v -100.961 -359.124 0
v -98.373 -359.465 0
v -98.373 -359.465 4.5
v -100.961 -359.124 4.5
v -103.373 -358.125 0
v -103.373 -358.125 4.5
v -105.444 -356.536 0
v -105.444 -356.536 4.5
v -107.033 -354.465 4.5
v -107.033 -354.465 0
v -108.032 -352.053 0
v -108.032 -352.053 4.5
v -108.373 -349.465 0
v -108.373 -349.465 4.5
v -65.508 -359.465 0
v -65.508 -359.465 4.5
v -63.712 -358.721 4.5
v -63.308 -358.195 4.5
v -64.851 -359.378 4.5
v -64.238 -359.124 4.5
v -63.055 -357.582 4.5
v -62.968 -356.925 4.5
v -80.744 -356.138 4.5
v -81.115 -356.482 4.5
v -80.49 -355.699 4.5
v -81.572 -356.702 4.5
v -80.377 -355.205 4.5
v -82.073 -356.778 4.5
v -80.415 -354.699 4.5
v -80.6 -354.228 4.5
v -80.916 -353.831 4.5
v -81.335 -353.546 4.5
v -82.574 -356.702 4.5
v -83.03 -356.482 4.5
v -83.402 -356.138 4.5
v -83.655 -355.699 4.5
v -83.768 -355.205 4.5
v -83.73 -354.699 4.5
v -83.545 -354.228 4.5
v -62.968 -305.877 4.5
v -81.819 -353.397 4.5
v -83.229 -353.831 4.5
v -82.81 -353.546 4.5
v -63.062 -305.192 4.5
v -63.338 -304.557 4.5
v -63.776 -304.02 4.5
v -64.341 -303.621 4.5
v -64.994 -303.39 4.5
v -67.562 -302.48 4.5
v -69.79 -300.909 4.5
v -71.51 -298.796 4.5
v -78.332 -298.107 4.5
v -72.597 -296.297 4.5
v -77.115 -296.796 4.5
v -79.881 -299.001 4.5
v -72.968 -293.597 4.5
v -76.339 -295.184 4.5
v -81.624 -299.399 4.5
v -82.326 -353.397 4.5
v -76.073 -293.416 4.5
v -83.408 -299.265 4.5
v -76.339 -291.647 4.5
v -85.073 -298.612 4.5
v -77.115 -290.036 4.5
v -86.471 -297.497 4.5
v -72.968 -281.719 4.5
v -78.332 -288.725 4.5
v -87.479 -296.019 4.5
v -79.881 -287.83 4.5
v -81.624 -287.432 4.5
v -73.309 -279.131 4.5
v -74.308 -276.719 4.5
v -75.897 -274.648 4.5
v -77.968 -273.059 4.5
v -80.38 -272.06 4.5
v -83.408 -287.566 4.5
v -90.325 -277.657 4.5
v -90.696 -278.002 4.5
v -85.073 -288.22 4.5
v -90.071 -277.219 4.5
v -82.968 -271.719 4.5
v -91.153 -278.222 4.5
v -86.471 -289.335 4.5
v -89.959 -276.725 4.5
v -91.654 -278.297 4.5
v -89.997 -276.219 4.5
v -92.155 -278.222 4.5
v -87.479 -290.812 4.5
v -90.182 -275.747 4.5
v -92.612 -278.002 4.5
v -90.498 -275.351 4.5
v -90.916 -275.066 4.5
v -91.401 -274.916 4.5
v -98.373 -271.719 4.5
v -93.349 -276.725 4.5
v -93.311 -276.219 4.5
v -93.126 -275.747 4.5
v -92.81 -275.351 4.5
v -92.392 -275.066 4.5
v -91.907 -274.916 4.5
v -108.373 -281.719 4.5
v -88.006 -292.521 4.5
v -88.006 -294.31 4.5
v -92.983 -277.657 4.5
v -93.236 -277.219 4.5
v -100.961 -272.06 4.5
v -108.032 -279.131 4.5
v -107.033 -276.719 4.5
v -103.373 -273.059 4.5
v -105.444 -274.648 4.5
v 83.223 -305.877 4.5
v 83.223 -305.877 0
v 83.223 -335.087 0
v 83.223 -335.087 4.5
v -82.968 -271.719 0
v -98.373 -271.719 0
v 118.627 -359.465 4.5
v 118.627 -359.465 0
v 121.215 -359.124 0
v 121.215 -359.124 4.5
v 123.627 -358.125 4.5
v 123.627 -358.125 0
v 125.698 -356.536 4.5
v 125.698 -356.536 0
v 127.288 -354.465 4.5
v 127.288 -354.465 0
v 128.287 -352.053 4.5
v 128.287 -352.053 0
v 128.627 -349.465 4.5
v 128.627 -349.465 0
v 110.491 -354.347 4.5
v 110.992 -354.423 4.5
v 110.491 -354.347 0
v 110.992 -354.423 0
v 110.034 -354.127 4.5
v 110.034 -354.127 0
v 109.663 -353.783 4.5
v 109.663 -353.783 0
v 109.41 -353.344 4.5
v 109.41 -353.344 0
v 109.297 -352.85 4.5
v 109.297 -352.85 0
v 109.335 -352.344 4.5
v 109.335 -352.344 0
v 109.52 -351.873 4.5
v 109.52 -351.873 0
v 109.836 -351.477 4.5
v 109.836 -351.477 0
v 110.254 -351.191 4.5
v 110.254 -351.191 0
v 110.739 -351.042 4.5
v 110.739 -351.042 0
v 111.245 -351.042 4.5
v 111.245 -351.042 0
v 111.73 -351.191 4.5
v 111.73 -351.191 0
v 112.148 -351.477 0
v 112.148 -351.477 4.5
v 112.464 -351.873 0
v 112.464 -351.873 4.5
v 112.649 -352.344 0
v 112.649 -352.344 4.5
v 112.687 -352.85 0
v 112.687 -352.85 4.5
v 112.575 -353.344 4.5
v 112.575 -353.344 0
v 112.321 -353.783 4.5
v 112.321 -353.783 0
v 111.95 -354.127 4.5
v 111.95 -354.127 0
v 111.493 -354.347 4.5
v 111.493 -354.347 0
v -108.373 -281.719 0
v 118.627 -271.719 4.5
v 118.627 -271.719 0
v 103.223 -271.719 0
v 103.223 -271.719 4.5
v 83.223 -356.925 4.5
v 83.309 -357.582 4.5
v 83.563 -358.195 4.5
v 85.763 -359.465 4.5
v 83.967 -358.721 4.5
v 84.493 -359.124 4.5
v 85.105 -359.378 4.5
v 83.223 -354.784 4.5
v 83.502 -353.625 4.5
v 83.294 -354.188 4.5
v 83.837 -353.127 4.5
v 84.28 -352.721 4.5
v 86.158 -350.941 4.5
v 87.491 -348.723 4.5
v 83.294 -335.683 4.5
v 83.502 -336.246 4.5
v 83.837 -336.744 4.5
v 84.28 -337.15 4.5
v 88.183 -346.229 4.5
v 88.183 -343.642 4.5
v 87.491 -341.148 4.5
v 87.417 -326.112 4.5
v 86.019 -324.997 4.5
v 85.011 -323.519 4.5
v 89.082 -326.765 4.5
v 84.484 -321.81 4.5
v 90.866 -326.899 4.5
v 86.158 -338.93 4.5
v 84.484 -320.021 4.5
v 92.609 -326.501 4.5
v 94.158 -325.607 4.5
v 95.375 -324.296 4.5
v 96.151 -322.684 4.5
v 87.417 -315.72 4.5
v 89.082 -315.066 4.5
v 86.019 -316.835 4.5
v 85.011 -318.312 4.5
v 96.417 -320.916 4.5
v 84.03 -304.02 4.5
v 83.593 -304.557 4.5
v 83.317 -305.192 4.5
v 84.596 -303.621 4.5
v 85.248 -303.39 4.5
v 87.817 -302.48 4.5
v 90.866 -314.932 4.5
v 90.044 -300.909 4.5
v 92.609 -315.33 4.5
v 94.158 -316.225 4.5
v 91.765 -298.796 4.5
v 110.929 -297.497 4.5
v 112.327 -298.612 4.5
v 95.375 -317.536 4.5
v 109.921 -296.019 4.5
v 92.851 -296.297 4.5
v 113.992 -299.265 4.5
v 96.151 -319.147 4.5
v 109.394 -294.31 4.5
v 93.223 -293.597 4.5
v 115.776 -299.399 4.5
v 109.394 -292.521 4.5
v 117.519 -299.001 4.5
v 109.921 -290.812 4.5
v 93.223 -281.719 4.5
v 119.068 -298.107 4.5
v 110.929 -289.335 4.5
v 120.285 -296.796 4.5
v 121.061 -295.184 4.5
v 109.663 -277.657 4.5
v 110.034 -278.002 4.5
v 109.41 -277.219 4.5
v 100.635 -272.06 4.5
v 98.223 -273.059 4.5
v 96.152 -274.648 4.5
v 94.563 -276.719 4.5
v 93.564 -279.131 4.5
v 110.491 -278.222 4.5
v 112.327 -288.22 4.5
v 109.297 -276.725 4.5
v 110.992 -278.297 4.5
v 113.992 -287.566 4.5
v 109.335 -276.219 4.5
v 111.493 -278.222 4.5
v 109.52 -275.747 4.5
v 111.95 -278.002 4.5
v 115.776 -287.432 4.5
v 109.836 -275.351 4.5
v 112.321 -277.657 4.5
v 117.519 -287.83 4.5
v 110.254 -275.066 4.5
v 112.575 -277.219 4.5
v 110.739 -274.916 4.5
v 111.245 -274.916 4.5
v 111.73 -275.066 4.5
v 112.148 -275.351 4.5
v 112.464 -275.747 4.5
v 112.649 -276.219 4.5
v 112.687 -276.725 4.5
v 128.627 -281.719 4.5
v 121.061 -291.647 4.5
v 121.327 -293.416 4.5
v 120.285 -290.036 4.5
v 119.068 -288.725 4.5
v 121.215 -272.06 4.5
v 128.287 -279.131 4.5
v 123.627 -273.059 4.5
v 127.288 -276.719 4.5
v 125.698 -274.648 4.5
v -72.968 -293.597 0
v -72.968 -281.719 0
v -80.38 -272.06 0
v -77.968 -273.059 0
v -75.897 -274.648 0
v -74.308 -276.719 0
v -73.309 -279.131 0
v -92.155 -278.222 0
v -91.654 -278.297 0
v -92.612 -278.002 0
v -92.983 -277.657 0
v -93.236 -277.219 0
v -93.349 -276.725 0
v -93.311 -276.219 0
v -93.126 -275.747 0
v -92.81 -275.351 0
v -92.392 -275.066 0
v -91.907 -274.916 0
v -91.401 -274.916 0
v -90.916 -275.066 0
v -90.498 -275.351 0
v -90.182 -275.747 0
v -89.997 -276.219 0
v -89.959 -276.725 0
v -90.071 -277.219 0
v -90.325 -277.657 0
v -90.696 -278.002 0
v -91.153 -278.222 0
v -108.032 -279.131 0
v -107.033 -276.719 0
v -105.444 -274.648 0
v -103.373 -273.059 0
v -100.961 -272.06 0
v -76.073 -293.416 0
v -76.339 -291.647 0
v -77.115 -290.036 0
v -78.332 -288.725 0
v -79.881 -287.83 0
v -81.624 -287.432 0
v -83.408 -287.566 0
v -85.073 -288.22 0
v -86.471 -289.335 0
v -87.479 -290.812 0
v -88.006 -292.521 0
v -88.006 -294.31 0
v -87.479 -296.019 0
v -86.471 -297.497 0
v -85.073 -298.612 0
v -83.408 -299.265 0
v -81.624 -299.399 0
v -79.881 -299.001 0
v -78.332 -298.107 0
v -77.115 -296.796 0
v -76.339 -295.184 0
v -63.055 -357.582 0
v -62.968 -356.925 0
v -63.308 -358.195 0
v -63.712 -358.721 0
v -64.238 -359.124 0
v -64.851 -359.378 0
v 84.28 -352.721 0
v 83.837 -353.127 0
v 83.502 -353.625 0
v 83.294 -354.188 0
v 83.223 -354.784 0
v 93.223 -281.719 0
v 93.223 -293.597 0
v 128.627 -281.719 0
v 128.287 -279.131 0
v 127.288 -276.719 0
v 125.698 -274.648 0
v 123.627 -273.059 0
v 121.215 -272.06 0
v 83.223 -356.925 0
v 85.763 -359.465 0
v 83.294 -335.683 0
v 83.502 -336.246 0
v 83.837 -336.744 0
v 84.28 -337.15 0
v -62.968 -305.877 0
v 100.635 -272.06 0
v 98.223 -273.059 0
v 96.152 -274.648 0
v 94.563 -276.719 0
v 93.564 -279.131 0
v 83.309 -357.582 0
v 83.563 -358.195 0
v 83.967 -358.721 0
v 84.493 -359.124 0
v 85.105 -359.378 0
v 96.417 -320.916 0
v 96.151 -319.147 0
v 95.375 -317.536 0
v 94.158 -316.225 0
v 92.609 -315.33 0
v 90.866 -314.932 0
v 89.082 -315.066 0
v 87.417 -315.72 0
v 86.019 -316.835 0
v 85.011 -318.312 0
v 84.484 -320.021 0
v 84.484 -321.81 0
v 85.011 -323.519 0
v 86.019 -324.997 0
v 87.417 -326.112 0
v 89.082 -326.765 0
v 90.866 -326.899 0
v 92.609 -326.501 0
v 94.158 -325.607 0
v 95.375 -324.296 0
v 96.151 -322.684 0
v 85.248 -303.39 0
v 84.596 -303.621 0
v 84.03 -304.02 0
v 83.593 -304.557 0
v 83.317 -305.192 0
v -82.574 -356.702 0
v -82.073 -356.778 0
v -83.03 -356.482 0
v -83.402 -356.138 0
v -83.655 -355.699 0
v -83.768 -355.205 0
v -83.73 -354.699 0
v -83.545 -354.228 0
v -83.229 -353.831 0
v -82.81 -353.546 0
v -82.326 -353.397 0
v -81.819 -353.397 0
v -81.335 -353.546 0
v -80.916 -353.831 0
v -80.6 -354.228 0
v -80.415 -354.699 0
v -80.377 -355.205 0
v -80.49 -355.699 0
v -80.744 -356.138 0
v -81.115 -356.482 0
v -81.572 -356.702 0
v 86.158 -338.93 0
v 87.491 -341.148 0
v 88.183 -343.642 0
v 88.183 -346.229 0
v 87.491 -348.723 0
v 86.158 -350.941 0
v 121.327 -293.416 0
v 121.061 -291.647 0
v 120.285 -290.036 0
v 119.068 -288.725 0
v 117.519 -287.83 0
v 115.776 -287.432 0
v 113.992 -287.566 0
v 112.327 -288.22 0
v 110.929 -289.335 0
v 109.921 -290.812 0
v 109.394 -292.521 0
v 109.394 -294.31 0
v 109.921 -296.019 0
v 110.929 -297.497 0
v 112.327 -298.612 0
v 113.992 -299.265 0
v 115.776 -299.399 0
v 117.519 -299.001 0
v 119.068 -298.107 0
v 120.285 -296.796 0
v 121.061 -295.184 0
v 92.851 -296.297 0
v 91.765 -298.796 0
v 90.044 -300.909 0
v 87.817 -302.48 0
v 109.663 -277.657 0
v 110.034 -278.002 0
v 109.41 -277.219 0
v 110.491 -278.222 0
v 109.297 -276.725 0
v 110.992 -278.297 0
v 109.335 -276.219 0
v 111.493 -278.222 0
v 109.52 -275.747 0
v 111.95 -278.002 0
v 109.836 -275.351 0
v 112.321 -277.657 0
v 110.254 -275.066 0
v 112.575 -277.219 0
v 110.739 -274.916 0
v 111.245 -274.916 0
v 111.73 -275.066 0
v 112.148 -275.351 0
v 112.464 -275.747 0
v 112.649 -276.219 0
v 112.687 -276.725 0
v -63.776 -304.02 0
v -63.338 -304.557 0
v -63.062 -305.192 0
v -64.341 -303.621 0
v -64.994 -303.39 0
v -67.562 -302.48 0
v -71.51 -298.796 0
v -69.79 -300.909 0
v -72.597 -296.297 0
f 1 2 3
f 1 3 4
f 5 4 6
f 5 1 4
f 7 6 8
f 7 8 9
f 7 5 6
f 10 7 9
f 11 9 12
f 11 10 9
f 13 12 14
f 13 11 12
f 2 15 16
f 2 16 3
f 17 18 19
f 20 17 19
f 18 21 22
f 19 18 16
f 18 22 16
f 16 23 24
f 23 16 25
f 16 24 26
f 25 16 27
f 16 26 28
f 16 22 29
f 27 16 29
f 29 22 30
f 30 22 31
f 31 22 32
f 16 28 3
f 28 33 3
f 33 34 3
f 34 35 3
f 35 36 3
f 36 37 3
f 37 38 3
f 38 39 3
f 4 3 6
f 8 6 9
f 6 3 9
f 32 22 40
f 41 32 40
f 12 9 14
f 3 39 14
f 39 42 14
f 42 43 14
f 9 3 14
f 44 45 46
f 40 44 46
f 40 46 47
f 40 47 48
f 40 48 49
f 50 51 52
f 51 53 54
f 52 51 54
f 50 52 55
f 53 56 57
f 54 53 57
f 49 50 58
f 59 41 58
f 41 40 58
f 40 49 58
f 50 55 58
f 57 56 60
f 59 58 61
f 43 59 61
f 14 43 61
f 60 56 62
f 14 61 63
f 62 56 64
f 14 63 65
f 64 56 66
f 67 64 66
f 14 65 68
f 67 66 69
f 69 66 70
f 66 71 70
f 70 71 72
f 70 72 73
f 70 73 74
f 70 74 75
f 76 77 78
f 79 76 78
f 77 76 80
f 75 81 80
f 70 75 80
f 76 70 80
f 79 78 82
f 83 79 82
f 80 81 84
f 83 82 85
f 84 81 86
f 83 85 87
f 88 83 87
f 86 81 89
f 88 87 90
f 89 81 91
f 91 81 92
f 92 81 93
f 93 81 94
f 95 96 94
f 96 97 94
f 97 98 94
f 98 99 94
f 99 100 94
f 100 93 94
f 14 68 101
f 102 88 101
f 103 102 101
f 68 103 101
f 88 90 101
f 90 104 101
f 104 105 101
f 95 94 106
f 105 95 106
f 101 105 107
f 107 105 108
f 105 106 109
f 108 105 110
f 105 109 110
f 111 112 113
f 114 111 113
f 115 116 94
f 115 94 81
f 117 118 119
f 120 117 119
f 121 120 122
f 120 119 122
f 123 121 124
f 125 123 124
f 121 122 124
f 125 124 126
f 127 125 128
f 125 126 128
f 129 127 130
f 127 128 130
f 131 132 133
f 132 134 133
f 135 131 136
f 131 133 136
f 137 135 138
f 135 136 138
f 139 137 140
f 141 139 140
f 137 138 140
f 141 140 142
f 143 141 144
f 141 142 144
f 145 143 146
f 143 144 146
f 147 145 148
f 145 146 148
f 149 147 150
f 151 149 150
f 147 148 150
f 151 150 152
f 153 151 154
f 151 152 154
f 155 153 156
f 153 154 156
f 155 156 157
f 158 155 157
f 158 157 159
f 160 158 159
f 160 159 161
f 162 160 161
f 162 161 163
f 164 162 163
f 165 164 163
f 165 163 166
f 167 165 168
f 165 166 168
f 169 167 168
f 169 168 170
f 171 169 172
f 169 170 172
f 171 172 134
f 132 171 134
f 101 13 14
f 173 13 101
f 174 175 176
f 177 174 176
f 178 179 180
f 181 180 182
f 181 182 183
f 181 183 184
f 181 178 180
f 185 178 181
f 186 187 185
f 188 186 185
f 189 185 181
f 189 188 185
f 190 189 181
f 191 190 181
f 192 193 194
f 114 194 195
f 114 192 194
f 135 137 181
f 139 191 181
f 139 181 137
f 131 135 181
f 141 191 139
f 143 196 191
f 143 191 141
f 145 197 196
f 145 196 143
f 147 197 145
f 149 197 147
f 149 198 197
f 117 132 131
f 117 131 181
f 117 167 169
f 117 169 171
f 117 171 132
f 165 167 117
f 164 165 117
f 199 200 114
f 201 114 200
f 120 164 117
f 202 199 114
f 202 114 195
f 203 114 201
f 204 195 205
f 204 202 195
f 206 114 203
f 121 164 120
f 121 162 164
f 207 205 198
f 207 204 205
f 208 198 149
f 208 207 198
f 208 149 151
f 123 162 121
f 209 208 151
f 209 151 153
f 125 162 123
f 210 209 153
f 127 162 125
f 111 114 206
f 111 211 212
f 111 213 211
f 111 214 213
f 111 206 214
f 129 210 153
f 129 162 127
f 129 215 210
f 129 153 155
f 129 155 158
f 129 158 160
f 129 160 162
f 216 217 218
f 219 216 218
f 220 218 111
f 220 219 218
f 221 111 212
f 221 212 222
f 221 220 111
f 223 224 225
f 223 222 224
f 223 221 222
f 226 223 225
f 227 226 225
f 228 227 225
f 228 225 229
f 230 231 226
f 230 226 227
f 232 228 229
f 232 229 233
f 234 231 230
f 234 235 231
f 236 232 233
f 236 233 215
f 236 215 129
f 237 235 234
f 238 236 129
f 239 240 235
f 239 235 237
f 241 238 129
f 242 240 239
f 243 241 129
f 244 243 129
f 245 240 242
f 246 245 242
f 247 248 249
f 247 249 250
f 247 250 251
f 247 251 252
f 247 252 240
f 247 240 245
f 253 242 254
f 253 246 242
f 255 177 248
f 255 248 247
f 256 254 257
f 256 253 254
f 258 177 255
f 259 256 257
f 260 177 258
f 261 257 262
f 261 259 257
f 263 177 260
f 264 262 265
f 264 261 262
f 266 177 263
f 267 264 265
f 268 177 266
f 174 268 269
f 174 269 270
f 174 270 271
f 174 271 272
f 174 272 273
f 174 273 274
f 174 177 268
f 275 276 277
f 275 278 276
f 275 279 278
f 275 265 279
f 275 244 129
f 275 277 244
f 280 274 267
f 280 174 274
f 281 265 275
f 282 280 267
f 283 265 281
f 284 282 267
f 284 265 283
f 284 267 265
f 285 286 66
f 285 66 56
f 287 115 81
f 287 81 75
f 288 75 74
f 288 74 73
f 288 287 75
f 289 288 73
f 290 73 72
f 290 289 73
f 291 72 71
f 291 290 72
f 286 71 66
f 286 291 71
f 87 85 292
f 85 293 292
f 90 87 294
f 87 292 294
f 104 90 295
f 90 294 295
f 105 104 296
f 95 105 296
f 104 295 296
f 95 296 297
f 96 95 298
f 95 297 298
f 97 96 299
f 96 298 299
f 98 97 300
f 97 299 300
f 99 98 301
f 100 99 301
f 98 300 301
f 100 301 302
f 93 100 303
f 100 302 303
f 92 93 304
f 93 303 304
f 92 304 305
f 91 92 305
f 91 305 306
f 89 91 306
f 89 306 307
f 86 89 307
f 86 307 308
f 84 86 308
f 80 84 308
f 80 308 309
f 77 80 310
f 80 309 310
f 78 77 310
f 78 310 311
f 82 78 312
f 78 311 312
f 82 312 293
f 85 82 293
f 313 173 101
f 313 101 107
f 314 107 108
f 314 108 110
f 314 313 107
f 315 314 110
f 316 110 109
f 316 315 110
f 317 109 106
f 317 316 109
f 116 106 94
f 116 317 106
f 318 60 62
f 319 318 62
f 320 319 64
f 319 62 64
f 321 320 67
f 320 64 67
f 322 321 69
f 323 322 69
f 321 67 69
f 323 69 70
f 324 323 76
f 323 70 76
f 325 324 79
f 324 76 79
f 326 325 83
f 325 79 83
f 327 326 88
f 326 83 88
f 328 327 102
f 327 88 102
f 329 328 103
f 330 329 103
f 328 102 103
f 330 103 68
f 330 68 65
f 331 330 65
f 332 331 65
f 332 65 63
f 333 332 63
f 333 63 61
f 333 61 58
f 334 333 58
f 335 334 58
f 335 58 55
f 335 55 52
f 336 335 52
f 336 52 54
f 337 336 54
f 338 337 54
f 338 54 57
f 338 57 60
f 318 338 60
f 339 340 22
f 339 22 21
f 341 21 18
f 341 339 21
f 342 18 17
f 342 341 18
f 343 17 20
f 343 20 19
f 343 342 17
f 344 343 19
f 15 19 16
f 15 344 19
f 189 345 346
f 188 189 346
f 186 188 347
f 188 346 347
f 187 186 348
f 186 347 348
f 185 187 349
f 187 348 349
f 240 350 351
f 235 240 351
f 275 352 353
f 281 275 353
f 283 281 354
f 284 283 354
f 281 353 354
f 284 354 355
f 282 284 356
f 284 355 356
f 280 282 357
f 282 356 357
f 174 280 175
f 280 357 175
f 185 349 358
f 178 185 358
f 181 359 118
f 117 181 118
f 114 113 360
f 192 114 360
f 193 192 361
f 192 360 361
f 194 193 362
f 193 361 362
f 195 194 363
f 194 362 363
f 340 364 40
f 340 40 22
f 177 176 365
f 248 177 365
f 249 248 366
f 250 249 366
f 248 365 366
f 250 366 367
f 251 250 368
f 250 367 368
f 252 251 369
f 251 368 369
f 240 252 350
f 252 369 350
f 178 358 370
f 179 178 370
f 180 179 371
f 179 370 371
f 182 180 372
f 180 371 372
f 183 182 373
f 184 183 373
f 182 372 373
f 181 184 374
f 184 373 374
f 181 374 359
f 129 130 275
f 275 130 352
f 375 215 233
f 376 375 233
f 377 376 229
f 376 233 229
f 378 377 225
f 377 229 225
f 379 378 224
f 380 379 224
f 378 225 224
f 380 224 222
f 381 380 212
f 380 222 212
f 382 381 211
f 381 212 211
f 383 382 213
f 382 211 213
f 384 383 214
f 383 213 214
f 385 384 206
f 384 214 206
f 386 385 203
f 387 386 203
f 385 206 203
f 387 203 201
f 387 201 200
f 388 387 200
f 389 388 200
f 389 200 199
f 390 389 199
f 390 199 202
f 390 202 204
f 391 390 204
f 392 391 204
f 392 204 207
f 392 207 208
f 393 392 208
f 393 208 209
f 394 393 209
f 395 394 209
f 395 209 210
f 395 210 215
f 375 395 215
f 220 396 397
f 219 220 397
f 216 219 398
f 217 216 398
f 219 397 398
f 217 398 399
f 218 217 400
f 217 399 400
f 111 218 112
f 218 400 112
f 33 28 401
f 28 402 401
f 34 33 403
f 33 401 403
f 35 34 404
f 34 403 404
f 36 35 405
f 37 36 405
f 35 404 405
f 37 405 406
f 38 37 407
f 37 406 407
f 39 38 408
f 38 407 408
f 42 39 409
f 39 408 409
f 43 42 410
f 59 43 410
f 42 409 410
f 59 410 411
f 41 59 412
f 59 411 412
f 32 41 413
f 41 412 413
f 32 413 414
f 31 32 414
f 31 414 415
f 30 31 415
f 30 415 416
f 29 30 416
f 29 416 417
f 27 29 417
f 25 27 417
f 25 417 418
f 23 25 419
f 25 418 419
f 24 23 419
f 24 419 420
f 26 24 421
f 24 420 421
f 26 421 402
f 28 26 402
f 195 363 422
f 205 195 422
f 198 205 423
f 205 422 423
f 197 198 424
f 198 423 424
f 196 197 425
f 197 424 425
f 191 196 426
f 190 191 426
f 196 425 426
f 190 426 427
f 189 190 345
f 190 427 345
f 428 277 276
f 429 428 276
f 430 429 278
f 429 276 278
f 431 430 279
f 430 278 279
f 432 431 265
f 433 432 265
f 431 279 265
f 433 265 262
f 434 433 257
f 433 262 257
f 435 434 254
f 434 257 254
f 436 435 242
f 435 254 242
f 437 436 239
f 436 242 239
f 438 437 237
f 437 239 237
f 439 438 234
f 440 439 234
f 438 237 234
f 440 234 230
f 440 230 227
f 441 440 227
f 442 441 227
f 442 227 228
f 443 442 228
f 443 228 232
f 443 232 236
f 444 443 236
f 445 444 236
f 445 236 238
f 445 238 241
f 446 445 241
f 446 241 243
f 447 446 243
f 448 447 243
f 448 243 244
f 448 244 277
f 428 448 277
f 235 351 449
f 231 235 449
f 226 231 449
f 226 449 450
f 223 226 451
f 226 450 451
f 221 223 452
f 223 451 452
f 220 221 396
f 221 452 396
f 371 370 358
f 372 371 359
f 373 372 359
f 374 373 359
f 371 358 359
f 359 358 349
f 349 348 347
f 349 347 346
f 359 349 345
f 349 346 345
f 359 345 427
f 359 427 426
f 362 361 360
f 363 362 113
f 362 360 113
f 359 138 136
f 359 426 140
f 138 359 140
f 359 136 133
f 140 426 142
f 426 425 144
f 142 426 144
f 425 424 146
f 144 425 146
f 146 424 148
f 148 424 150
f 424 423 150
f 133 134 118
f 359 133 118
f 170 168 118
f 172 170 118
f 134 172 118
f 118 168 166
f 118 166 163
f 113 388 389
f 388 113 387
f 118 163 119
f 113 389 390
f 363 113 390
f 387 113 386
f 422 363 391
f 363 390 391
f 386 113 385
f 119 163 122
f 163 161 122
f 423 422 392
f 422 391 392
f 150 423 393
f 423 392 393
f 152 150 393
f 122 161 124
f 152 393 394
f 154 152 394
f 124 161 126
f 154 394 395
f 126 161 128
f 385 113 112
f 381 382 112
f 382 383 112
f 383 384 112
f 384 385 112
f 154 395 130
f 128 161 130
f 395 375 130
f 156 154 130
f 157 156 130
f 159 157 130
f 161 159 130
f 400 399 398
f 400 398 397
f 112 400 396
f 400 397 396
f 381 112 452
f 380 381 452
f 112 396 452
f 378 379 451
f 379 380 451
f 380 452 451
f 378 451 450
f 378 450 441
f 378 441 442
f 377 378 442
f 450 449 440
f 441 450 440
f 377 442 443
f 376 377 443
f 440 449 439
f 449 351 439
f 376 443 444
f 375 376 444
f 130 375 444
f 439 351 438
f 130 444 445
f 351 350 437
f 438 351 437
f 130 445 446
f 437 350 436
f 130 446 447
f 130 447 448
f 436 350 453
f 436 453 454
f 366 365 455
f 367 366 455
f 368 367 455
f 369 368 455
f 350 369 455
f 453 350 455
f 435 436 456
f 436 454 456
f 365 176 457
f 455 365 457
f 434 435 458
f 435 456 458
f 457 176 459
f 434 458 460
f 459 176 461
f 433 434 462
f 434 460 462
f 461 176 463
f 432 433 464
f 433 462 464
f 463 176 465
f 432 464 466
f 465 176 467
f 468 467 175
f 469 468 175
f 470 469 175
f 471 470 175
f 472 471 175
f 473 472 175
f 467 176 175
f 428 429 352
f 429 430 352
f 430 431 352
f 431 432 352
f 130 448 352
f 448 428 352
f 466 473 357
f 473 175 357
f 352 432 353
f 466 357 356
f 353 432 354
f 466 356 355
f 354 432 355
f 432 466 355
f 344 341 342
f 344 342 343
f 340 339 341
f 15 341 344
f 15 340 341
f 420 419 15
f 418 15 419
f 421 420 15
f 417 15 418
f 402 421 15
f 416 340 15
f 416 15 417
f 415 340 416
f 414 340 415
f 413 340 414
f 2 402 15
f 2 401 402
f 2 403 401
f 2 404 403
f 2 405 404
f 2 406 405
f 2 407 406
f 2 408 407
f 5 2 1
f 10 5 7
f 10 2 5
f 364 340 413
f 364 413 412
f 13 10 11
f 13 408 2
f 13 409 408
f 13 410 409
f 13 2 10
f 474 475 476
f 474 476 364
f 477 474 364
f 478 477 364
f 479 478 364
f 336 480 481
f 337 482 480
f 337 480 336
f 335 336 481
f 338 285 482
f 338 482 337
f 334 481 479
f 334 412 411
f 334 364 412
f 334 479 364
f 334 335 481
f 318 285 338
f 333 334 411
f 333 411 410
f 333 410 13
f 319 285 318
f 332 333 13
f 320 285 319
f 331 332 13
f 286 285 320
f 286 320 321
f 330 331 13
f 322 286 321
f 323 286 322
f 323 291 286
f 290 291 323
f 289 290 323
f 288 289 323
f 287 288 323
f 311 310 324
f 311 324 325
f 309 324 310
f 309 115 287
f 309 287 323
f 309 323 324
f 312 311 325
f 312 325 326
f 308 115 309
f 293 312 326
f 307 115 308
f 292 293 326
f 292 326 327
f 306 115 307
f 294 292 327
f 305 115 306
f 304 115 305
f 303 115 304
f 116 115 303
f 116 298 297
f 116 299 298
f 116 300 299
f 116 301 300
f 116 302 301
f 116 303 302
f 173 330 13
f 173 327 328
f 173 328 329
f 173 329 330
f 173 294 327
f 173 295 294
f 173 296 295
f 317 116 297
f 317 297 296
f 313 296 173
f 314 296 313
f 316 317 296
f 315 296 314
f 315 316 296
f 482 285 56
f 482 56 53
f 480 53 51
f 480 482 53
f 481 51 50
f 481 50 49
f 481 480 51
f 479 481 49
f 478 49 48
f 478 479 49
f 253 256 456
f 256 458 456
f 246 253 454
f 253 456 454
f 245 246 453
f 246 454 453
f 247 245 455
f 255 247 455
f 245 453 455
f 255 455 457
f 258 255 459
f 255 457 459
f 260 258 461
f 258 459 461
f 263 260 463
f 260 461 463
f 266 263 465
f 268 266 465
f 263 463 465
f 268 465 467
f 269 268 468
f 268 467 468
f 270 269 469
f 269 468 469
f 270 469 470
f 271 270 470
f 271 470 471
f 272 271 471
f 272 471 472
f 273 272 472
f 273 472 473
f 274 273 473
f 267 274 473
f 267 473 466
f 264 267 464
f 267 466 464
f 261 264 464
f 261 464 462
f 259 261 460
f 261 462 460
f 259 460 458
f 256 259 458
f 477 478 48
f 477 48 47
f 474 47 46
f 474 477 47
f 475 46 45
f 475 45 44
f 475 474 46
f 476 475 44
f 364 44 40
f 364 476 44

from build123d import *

# Parameters (mm, degrees)
BOSS_EXTRUDE1_DEPTH           = 4.5
BOSS_EXTRUDE1_2_DEPTH         = 4.5
SKETCH2_W                     = 1.7
SKETCH2_H                     = 4.5
M3_CLEARANCE_HOLE1_AT_2_COUNT = 2
M3_CLEARANCE_HOLE1_AT_2_PITCH = 197.4
M3_CLEARANCE_HOLE1_AT_3_COUNT = 2
M3_CLEARANCE_HOLE1_AT_3_PITCH = 37.104691078
M3_CLEARANCE_HOLE1_AT_4_COUNT = 2
M3_CLEARANCE_HOLE1_AT_4_PITCH = 206.806557667
SKETCH4_R                     = 6
CUT_EXTRUDE1_DEPTH            = 10
SKETCH5_W                     = 1.7
SKETCH5_H                     = 4.5
M3_CLEARANCE_HOLE2_AT_2_COUNT = 2
M3_CLEARANCE_HOLE2_AT_2_PITCH = 76.125208572
M3_CLEARANCE_HOLE2_AT_3_COUNT = 2
M3_CLEARANCE_HOLE2_AT_3_PITCH = 202.646007696


with BuildPart() as part:
    # Sketch1 → Boss-Extrude1 (new body)
    with BuildSketch(Plane.XY):
        with BuildLine():
            Line((83.222758289, -305.87735135), (83.222758289, -335.087441965))
            ThreePointArc((83.222758289, -335.087441965), (83.502426869, -336.246105795), (84.279846376, -337.149618548))
            ThreePointArc((84.279846376, -337.149618548), (88.270952069, -344.935502047), (84.279846376, -352.721385546))
            ThreePointArc((84.279846376, -352.721385546), (83.502426869, -353.624898299), (83.222758289, -354.78356213))
            Line((83.222758289, -354.78356213), (83.222758289, -356.924720764))
            ThreePointArc((83.222758289, -356.924720764), (83.966707064, -358.720771988), (85.762758289, -359.464720764))
            Line((85.762758289, -359.464720764), (118.627293893, -359.464720764))
            ThreePointArc((118.627293893, -359.464720764), (125.698361705, -356.535788576), (128.627293893, -349.464720764))
            Line((128.627293893, -349.464720764), (128.627293893, -281.718782294))
            ThreePointArc((128.627293893, -281.718782294), (125.698361705, -274.647714482), (118.627293893, -271.718782294))
            Line((118.627293893, -271.718782294), (103.222758289, -271.718782294))
            ThreePointArc((103.222758289, -271.718782294), (96.151690477, -274.647714482), (93.222758289, -281.718782294))
            Line((93.222758289, -281.718782294), (93.222758289, -293.597286204))
            ThreePointArc((93.222758289, -293.597286204), (90.976956616, -299.911746457), (85.24827663, -303.390001631))
            ThreePointArc((85.24827663, -303.390001631), (83.793191913, -304.273478446), (83.222758289, -305.87735135))
        make_face()
    extrude(amount=BOSS_EXTRUDE1_DEPTH)

    # Sketch2 → M3 Clearance Hole1 (revolve, cut)
    with BuildSketch(Plane(origin=(115.327293893, -293.415681156, 4.5), x_dir=(0, -1, 0), z_dir=(1, 0, 0))):
        with Locations((0.85, 2.25)):
            Rectangle(SKETCH2_W, SKETCH2_H)
    m3_clearance_hole1 = revolve(axis=Axis((115.327293893, -293.415681156, 10.85), (0, 0, -1)), mode=Mode.SUBTRACT)

    # M3 Clearance Hole1 at 3: M3 Clearance Hole1 ×2
    with Locations(*[Vector(-0.671343684, -0.741146179, 0) * (i * M3_CLEARANCE_HOLE1_AT_3_PITCH) for i in range(1, M3_CLEARANCE_HOLE1_AT_3_COUNT)]):
        add(m3_clearance_hole1, mode=Mode.SUBTRACT)


with BuildPart() as body_2:
    # Sketch1 → Boss-Extrude1 2 (new body)
    with BuildSketch(Plane.XY):
        with BuildLine():
            Line((-62.968170503, -305.87735135), (-62.968170503, -356.924720764))
            ThreePointArc((-62.968170503, -356.924720764), (-63.712119279, -358.720771988), (-65.508170503, -359.464720764))
            Line((-65.508170503, -359.464720764), (-98.372706107, -359.464720764))
            ThreePointArc((-98.372706107, -359.464720764), (-105.443773919, -356.535788576), (-108.372706107, -349.464720764))
            Line((-108.372706107, -349.464720764), (-108.372706107, -281.718782294))
            ThreePointArc((-108.372706107, -281.718782294), (-105.443773919, -274.647714482), (-98.372706107, -271.718782294))
            Line((-98.372706107, -271.718782294), (-82.968170503, -271.718782294))
            ThreePointArc((-82.968170503, -271.718782294), (-75.897102691, -274.647714482), (-72.968170503, -281.718782294))
            Line((-72.968170503, -281.718782294), (-72.968170503, -293.597286204))
            ThreePointArc((-72.968170503, -293.597286204), (-70.722368831, -299.911746457), (-64.993688844, -303.390001631))
            ThreePointArc((-64.993688844, -303.390001631), (-63.538604128, -304.273478446), (-62.968170503, -305.87735135))
        make_face()
    extrude(amount=BOSS_EXTRUDE1_2_DEPTH)

    # M3 Clearance Hole1 at 2: M3 Clearance Hole1 ×2
    with Locations(*[(-i * M3_CLEARANCE_HOLE1_AT_2_PITCH, 0, 0) for i in range(1, M3_CLEARANCE_HOLE1_AT_2_COUNT)]):
        add(m3_clearance_hole1, mode=Mode.SUBTRACT)

    # M3 Clearance Hole1 at 4: M3 Clearance Hole1 ×2
    with Locations(*[Vector(-0.954515187, -0.298162302, 0) * (i * M3_CLEARANCE_HOLE1_AT_4_PITCH) for i in range(1, M3_CLEARANCE_HOLE1_AT_4_COUNT)]):
        add(m3_clearance_hole1, mode=Mode.SUBTRACT)


with BuildPart() as cut_extrude1_tool:
    # Sketch4 → Cut-Extrude1 (new body)
    with BuildSketch(Plane.XY.offset(4.5)):
        with Locations((115.327293893, -293.415681156)):
            Circle(SKETCH4_R)
        with Locations((90.417293893, -320.915681156)):
            Circle(SKETCH4_R)
        with Locations((-82.072706107, -293.415681156)):
            Circle(SKETCH4_R)
    extrude(amount=-CUT_EXTRUDE1_DEPTH)


with BuildPart() as part_1:
    add(part.part)

    # Cut-Extrude1: cut by cut_extrude1_tool
    add(cut_extrude1_tool.part, mode=Mode.SUBTRACT)

    # Sketch5 → M3 Clearance Hole2 (revolve, cut)
    with BuildSketch(Plane(origin=(110.992072638, -276.597499362, 4.5), x_dir=(0, -1, 0), z_dir=(1, 0, 0))):
        with Locations((0.85, 2.25)):
            Rectangle(SKETCH5_W, SKETCH5_H)
    m3_clearance_hole2 = revolve(axis=Axis((110.992072638, -276.597499362, 10.85), (0, 0, -1)), mode=Mode.SUBTRACT)

    # M3 Clearance Hole2 at 2: M3 Clearance Hole2 ×2
    with Locations(*[(0, -i * M3_CLEARANCE_HOLE2_AT_2_PITCH, 0) for i in range(1, M3_CLEARANCE_HOLE2_AT_2_COUNT)]):
        add(m3_clearance_hole2, mode=Mode.SUBTRACT)


with BuildPart() as body_2_1:
    add(body_2.part)

    # Cut-Extrude1: cut by cut_extrude1_tool
    add(cut_extrude1_tool.part, mode=Mode.SUBTRACT)

    # M3 Clearance Hole2 at 3: M3 Clearance Hole2 ×2
    with Locations(*[(-i * M3_CLEARANCE_HOLE2_AT_3_PITCH, 0, 0) for i in range(1, M3_CLEARANCE_HOLE2_AT_3_COUNT)]):
        add(m3_clearance_hole2, mode=Mode.SUBTRACT)


solid = Compound([part_1.part, body_2_1.part])
